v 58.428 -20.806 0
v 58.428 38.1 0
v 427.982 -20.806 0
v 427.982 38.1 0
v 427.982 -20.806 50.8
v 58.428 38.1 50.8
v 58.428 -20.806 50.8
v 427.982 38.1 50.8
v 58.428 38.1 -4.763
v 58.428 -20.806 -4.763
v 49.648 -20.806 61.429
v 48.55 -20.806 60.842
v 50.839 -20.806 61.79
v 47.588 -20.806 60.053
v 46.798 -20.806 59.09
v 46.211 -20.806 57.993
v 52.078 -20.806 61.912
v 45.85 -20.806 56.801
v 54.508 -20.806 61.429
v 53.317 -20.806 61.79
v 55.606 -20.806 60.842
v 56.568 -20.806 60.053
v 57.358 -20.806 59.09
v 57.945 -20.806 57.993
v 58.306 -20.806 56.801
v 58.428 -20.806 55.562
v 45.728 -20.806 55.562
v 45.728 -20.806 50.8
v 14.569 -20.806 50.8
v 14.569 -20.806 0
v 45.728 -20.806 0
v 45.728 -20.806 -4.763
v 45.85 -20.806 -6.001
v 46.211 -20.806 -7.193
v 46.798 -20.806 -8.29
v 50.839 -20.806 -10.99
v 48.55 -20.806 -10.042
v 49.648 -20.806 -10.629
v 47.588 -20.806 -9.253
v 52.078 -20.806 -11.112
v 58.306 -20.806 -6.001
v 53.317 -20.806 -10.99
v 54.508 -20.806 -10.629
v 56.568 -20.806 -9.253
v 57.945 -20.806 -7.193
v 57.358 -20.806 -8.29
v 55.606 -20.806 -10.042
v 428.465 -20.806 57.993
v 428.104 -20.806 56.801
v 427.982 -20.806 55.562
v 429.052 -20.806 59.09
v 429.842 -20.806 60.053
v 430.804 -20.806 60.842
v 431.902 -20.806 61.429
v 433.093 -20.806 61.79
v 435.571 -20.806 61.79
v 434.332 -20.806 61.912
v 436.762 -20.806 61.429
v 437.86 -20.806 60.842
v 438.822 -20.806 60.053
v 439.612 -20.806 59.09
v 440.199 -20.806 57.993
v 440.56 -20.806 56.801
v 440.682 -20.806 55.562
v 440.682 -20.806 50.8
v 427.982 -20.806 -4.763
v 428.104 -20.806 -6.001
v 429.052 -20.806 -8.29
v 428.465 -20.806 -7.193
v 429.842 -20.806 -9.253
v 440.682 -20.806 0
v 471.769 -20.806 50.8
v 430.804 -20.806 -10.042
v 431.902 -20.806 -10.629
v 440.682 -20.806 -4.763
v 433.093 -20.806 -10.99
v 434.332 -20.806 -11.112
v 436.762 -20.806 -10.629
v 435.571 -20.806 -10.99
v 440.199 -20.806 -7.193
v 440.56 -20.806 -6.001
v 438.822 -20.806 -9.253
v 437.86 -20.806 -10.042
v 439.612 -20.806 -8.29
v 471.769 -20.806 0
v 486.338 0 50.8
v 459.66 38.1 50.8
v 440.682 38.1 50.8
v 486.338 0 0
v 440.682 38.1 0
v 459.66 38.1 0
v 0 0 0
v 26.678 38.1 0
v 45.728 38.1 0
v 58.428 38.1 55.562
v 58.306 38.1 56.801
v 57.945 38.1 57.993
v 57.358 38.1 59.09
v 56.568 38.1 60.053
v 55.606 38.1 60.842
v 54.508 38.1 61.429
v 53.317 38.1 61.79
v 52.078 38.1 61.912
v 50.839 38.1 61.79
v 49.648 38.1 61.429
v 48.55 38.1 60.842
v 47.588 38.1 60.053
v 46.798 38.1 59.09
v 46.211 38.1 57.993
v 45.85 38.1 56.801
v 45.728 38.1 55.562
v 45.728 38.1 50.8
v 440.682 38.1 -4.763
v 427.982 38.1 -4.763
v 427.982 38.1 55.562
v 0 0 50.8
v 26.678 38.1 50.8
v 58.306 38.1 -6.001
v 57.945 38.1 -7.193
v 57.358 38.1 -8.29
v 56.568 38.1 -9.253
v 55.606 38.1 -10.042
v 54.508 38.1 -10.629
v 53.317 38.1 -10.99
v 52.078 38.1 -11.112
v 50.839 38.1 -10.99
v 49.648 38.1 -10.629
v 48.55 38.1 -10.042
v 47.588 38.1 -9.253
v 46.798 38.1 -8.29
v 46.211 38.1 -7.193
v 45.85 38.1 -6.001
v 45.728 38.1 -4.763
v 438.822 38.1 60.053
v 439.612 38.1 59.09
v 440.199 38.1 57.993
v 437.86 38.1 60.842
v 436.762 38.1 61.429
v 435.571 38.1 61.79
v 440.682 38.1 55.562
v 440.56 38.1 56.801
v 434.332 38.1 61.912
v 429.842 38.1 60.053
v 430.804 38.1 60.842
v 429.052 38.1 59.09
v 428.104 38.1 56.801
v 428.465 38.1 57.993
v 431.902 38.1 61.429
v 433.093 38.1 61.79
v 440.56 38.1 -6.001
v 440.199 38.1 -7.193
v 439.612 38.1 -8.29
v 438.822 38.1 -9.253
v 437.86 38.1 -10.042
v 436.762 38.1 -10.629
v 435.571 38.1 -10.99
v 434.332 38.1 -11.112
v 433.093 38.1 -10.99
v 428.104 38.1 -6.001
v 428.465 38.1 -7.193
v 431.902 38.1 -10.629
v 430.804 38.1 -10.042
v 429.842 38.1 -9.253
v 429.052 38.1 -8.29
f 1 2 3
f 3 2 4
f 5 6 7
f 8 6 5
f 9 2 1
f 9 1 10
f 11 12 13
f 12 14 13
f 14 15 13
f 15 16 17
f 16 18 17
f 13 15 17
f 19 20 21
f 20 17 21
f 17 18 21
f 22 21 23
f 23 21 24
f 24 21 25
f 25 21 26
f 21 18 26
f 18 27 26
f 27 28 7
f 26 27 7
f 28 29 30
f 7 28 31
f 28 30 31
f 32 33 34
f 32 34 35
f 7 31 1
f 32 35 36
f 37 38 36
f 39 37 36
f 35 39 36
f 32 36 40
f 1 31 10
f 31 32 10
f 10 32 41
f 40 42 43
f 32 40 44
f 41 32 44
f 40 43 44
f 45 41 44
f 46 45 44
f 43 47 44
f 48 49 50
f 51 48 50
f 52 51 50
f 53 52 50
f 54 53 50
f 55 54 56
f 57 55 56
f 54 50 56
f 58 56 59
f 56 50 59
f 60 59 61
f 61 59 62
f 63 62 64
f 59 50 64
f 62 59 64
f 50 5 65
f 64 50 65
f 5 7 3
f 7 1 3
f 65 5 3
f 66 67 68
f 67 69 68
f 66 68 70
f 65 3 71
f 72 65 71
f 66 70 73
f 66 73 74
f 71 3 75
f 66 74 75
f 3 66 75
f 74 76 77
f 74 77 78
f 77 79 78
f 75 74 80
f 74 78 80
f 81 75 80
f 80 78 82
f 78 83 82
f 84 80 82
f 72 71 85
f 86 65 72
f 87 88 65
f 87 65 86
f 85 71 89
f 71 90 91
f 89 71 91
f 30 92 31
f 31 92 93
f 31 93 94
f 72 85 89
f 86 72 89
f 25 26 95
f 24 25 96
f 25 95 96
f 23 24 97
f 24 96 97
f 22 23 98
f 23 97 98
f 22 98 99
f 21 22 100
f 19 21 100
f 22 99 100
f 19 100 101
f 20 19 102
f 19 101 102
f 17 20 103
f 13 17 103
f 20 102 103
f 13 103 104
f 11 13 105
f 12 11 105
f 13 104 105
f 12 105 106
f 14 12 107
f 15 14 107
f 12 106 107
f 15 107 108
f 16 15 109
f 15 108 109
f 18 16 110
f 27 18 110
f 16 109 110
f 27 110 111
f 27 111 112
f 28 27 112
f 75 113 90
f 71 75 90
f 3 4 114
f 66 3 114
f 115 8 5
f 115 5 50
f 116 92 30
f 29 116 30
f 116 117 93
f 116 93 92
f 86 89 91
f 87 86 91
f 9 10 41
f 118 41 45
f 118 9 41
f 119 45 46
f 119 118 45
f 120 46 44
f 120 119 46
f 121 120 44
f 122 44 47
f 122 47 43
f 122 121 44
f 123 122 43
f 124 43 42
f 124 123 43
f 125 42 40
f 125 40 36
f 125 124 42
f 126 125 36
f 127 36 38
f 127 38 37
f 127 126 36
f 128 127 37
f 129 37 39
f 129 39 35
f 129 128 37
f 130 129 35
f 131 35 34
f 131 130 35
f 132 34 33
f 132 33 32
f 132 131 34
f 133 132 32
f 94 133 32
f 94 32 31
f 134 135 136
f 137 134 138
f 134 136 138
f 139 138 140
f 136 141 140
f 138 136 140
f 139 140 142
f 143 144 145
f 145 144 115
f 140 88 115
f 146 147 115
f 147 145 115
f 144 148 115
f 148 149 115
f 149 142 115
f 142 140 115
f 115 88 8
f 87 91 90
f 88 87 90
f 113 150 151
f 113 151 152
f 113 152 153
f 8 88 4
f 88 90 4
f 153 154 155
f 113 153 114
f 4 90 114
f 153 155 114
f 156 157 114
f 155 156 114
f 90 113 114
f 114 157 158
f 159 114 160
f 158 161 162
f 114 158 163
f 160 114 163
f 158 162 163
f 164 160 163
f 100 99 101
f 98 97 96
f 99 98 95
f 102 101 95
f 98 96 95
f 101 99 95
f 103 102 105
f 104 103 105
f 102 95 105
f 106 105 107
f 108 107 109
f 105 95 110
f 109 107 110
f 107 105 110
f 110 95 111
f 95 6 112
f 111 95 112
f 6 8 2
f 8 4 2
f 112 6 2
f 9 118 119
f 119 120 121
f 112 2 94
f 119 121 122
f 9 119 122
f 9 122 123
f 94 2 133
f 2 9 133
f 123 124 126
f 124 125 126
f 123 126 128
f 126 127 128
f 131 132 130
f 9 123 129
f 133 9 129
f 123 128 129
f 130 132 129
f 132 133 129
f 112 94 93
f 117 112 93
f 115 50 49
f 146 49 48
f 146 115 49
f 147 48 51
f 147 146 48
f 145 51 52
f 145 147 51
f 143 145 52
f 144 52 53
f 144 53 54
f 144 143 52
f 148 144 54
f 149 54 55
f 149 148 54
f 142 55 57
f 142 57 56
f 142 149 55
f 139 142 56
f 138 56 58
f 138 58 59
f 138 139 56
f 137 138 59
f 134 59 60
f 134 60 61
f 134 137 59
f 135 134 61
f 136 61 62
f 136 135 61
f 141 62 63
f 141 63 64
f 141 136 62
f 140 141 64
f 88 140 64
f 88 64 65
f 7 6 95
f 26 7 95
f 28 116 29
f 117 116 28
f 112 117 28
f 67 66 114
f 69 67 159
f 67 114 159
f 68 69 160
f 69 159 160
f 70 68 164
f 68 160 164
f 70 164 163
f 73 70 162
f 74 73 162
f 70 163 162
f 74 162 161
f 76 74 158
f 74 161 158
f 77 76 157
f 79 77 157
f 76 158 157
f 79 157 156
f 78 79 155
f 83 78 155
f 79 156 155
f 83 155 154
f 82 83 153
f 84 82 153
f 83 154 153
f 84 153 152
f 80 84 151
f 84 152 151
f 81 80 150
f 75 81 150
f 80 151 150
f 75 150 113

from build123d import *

# Parameters (mm, degrees)
BOSS_EXTRUDE3_DEPTH                      = 50.8
BOSS_EXTRUDE4_DEPTH                      = 58.906461925
MIRROR1_AT_THE_SECOND_PLANE_COPY_1_DEPTH = 58.906461925


with BuildPart() as part:
    # Sketch3 → Boss-Extrude3 (new body)
    with BuildSketch(Plane.XY):
        Polygon((0, 0), (14.568841483, -20.806461925), (471.768841483, -20.806461925), (486.337682967, 0), (459.659775761, 38.1), (26.677907206, 38.1), align=None)
    extrude(amount=BOSS_EXTRUDE3_DEPTH)

    # Sketch4 → Boss-Extrude4 (add)
    with BuildSketch(Plane(origin=(0, 38.1, 0), x_dir=(1, 0, 0), z_dir=(0, 1, 0))):
        with BuildLine():
            Line((45.727907206, -55.5625), (45.727907206, -50.8))
            Line((45.727907206, -50.8), (58.427907206, -50.8))
            Line((58.427907206, -50.8), (58.427907206, -55.5625))
            ThreePointArc((58.427907206, -55.5625), (52.077907206, -61.9125), (45.727907206, -55.5625))
        make_face()
    boss_extrude4 = extrude(amount=-BOSS_EXTRUDE4_DEPTH)

    # Mirror1: Boss-Extrude4 across plane
    add(boss_extrude4.mirror(Plane(origin=(243.205, 0, 0), x_dir=(0, 0, 1), z_dir=(1, 0, 0))))

    # Mirror1 at the second plane: Boss-Extrude4 across plane
    add(boss_extrude4.mirror(Plane.XY.offset(25.4)))

    # Mirror1 at the second plane copy 1 sketc → Mirror1 at the second plane copy 1 (add)
    with BuildSketch(Plane(origin=(486.41, 38.1, 50.8), x_dir=(-1, 0, 0), z_dir=(0, 1, 0))):
        with BuildLine():
            Line((45.727907206, -55.5625), (45.727907206, -50.8))
            Line((45.727907206, -50.8), (58.427907206, -50.8))
            Line((58.427907206, -50.8), (58.427907206, -55.5625))
            ThreePointArc((58.427907206, -55.5625), (52.077907206, -61.9125), (45.727907206, -55.5625))
        make_face()
    extrude(amount=-MIRROR1_AT_THE_SECOND_PLANE_COPY_1_DEPTH)


solid = part.part
